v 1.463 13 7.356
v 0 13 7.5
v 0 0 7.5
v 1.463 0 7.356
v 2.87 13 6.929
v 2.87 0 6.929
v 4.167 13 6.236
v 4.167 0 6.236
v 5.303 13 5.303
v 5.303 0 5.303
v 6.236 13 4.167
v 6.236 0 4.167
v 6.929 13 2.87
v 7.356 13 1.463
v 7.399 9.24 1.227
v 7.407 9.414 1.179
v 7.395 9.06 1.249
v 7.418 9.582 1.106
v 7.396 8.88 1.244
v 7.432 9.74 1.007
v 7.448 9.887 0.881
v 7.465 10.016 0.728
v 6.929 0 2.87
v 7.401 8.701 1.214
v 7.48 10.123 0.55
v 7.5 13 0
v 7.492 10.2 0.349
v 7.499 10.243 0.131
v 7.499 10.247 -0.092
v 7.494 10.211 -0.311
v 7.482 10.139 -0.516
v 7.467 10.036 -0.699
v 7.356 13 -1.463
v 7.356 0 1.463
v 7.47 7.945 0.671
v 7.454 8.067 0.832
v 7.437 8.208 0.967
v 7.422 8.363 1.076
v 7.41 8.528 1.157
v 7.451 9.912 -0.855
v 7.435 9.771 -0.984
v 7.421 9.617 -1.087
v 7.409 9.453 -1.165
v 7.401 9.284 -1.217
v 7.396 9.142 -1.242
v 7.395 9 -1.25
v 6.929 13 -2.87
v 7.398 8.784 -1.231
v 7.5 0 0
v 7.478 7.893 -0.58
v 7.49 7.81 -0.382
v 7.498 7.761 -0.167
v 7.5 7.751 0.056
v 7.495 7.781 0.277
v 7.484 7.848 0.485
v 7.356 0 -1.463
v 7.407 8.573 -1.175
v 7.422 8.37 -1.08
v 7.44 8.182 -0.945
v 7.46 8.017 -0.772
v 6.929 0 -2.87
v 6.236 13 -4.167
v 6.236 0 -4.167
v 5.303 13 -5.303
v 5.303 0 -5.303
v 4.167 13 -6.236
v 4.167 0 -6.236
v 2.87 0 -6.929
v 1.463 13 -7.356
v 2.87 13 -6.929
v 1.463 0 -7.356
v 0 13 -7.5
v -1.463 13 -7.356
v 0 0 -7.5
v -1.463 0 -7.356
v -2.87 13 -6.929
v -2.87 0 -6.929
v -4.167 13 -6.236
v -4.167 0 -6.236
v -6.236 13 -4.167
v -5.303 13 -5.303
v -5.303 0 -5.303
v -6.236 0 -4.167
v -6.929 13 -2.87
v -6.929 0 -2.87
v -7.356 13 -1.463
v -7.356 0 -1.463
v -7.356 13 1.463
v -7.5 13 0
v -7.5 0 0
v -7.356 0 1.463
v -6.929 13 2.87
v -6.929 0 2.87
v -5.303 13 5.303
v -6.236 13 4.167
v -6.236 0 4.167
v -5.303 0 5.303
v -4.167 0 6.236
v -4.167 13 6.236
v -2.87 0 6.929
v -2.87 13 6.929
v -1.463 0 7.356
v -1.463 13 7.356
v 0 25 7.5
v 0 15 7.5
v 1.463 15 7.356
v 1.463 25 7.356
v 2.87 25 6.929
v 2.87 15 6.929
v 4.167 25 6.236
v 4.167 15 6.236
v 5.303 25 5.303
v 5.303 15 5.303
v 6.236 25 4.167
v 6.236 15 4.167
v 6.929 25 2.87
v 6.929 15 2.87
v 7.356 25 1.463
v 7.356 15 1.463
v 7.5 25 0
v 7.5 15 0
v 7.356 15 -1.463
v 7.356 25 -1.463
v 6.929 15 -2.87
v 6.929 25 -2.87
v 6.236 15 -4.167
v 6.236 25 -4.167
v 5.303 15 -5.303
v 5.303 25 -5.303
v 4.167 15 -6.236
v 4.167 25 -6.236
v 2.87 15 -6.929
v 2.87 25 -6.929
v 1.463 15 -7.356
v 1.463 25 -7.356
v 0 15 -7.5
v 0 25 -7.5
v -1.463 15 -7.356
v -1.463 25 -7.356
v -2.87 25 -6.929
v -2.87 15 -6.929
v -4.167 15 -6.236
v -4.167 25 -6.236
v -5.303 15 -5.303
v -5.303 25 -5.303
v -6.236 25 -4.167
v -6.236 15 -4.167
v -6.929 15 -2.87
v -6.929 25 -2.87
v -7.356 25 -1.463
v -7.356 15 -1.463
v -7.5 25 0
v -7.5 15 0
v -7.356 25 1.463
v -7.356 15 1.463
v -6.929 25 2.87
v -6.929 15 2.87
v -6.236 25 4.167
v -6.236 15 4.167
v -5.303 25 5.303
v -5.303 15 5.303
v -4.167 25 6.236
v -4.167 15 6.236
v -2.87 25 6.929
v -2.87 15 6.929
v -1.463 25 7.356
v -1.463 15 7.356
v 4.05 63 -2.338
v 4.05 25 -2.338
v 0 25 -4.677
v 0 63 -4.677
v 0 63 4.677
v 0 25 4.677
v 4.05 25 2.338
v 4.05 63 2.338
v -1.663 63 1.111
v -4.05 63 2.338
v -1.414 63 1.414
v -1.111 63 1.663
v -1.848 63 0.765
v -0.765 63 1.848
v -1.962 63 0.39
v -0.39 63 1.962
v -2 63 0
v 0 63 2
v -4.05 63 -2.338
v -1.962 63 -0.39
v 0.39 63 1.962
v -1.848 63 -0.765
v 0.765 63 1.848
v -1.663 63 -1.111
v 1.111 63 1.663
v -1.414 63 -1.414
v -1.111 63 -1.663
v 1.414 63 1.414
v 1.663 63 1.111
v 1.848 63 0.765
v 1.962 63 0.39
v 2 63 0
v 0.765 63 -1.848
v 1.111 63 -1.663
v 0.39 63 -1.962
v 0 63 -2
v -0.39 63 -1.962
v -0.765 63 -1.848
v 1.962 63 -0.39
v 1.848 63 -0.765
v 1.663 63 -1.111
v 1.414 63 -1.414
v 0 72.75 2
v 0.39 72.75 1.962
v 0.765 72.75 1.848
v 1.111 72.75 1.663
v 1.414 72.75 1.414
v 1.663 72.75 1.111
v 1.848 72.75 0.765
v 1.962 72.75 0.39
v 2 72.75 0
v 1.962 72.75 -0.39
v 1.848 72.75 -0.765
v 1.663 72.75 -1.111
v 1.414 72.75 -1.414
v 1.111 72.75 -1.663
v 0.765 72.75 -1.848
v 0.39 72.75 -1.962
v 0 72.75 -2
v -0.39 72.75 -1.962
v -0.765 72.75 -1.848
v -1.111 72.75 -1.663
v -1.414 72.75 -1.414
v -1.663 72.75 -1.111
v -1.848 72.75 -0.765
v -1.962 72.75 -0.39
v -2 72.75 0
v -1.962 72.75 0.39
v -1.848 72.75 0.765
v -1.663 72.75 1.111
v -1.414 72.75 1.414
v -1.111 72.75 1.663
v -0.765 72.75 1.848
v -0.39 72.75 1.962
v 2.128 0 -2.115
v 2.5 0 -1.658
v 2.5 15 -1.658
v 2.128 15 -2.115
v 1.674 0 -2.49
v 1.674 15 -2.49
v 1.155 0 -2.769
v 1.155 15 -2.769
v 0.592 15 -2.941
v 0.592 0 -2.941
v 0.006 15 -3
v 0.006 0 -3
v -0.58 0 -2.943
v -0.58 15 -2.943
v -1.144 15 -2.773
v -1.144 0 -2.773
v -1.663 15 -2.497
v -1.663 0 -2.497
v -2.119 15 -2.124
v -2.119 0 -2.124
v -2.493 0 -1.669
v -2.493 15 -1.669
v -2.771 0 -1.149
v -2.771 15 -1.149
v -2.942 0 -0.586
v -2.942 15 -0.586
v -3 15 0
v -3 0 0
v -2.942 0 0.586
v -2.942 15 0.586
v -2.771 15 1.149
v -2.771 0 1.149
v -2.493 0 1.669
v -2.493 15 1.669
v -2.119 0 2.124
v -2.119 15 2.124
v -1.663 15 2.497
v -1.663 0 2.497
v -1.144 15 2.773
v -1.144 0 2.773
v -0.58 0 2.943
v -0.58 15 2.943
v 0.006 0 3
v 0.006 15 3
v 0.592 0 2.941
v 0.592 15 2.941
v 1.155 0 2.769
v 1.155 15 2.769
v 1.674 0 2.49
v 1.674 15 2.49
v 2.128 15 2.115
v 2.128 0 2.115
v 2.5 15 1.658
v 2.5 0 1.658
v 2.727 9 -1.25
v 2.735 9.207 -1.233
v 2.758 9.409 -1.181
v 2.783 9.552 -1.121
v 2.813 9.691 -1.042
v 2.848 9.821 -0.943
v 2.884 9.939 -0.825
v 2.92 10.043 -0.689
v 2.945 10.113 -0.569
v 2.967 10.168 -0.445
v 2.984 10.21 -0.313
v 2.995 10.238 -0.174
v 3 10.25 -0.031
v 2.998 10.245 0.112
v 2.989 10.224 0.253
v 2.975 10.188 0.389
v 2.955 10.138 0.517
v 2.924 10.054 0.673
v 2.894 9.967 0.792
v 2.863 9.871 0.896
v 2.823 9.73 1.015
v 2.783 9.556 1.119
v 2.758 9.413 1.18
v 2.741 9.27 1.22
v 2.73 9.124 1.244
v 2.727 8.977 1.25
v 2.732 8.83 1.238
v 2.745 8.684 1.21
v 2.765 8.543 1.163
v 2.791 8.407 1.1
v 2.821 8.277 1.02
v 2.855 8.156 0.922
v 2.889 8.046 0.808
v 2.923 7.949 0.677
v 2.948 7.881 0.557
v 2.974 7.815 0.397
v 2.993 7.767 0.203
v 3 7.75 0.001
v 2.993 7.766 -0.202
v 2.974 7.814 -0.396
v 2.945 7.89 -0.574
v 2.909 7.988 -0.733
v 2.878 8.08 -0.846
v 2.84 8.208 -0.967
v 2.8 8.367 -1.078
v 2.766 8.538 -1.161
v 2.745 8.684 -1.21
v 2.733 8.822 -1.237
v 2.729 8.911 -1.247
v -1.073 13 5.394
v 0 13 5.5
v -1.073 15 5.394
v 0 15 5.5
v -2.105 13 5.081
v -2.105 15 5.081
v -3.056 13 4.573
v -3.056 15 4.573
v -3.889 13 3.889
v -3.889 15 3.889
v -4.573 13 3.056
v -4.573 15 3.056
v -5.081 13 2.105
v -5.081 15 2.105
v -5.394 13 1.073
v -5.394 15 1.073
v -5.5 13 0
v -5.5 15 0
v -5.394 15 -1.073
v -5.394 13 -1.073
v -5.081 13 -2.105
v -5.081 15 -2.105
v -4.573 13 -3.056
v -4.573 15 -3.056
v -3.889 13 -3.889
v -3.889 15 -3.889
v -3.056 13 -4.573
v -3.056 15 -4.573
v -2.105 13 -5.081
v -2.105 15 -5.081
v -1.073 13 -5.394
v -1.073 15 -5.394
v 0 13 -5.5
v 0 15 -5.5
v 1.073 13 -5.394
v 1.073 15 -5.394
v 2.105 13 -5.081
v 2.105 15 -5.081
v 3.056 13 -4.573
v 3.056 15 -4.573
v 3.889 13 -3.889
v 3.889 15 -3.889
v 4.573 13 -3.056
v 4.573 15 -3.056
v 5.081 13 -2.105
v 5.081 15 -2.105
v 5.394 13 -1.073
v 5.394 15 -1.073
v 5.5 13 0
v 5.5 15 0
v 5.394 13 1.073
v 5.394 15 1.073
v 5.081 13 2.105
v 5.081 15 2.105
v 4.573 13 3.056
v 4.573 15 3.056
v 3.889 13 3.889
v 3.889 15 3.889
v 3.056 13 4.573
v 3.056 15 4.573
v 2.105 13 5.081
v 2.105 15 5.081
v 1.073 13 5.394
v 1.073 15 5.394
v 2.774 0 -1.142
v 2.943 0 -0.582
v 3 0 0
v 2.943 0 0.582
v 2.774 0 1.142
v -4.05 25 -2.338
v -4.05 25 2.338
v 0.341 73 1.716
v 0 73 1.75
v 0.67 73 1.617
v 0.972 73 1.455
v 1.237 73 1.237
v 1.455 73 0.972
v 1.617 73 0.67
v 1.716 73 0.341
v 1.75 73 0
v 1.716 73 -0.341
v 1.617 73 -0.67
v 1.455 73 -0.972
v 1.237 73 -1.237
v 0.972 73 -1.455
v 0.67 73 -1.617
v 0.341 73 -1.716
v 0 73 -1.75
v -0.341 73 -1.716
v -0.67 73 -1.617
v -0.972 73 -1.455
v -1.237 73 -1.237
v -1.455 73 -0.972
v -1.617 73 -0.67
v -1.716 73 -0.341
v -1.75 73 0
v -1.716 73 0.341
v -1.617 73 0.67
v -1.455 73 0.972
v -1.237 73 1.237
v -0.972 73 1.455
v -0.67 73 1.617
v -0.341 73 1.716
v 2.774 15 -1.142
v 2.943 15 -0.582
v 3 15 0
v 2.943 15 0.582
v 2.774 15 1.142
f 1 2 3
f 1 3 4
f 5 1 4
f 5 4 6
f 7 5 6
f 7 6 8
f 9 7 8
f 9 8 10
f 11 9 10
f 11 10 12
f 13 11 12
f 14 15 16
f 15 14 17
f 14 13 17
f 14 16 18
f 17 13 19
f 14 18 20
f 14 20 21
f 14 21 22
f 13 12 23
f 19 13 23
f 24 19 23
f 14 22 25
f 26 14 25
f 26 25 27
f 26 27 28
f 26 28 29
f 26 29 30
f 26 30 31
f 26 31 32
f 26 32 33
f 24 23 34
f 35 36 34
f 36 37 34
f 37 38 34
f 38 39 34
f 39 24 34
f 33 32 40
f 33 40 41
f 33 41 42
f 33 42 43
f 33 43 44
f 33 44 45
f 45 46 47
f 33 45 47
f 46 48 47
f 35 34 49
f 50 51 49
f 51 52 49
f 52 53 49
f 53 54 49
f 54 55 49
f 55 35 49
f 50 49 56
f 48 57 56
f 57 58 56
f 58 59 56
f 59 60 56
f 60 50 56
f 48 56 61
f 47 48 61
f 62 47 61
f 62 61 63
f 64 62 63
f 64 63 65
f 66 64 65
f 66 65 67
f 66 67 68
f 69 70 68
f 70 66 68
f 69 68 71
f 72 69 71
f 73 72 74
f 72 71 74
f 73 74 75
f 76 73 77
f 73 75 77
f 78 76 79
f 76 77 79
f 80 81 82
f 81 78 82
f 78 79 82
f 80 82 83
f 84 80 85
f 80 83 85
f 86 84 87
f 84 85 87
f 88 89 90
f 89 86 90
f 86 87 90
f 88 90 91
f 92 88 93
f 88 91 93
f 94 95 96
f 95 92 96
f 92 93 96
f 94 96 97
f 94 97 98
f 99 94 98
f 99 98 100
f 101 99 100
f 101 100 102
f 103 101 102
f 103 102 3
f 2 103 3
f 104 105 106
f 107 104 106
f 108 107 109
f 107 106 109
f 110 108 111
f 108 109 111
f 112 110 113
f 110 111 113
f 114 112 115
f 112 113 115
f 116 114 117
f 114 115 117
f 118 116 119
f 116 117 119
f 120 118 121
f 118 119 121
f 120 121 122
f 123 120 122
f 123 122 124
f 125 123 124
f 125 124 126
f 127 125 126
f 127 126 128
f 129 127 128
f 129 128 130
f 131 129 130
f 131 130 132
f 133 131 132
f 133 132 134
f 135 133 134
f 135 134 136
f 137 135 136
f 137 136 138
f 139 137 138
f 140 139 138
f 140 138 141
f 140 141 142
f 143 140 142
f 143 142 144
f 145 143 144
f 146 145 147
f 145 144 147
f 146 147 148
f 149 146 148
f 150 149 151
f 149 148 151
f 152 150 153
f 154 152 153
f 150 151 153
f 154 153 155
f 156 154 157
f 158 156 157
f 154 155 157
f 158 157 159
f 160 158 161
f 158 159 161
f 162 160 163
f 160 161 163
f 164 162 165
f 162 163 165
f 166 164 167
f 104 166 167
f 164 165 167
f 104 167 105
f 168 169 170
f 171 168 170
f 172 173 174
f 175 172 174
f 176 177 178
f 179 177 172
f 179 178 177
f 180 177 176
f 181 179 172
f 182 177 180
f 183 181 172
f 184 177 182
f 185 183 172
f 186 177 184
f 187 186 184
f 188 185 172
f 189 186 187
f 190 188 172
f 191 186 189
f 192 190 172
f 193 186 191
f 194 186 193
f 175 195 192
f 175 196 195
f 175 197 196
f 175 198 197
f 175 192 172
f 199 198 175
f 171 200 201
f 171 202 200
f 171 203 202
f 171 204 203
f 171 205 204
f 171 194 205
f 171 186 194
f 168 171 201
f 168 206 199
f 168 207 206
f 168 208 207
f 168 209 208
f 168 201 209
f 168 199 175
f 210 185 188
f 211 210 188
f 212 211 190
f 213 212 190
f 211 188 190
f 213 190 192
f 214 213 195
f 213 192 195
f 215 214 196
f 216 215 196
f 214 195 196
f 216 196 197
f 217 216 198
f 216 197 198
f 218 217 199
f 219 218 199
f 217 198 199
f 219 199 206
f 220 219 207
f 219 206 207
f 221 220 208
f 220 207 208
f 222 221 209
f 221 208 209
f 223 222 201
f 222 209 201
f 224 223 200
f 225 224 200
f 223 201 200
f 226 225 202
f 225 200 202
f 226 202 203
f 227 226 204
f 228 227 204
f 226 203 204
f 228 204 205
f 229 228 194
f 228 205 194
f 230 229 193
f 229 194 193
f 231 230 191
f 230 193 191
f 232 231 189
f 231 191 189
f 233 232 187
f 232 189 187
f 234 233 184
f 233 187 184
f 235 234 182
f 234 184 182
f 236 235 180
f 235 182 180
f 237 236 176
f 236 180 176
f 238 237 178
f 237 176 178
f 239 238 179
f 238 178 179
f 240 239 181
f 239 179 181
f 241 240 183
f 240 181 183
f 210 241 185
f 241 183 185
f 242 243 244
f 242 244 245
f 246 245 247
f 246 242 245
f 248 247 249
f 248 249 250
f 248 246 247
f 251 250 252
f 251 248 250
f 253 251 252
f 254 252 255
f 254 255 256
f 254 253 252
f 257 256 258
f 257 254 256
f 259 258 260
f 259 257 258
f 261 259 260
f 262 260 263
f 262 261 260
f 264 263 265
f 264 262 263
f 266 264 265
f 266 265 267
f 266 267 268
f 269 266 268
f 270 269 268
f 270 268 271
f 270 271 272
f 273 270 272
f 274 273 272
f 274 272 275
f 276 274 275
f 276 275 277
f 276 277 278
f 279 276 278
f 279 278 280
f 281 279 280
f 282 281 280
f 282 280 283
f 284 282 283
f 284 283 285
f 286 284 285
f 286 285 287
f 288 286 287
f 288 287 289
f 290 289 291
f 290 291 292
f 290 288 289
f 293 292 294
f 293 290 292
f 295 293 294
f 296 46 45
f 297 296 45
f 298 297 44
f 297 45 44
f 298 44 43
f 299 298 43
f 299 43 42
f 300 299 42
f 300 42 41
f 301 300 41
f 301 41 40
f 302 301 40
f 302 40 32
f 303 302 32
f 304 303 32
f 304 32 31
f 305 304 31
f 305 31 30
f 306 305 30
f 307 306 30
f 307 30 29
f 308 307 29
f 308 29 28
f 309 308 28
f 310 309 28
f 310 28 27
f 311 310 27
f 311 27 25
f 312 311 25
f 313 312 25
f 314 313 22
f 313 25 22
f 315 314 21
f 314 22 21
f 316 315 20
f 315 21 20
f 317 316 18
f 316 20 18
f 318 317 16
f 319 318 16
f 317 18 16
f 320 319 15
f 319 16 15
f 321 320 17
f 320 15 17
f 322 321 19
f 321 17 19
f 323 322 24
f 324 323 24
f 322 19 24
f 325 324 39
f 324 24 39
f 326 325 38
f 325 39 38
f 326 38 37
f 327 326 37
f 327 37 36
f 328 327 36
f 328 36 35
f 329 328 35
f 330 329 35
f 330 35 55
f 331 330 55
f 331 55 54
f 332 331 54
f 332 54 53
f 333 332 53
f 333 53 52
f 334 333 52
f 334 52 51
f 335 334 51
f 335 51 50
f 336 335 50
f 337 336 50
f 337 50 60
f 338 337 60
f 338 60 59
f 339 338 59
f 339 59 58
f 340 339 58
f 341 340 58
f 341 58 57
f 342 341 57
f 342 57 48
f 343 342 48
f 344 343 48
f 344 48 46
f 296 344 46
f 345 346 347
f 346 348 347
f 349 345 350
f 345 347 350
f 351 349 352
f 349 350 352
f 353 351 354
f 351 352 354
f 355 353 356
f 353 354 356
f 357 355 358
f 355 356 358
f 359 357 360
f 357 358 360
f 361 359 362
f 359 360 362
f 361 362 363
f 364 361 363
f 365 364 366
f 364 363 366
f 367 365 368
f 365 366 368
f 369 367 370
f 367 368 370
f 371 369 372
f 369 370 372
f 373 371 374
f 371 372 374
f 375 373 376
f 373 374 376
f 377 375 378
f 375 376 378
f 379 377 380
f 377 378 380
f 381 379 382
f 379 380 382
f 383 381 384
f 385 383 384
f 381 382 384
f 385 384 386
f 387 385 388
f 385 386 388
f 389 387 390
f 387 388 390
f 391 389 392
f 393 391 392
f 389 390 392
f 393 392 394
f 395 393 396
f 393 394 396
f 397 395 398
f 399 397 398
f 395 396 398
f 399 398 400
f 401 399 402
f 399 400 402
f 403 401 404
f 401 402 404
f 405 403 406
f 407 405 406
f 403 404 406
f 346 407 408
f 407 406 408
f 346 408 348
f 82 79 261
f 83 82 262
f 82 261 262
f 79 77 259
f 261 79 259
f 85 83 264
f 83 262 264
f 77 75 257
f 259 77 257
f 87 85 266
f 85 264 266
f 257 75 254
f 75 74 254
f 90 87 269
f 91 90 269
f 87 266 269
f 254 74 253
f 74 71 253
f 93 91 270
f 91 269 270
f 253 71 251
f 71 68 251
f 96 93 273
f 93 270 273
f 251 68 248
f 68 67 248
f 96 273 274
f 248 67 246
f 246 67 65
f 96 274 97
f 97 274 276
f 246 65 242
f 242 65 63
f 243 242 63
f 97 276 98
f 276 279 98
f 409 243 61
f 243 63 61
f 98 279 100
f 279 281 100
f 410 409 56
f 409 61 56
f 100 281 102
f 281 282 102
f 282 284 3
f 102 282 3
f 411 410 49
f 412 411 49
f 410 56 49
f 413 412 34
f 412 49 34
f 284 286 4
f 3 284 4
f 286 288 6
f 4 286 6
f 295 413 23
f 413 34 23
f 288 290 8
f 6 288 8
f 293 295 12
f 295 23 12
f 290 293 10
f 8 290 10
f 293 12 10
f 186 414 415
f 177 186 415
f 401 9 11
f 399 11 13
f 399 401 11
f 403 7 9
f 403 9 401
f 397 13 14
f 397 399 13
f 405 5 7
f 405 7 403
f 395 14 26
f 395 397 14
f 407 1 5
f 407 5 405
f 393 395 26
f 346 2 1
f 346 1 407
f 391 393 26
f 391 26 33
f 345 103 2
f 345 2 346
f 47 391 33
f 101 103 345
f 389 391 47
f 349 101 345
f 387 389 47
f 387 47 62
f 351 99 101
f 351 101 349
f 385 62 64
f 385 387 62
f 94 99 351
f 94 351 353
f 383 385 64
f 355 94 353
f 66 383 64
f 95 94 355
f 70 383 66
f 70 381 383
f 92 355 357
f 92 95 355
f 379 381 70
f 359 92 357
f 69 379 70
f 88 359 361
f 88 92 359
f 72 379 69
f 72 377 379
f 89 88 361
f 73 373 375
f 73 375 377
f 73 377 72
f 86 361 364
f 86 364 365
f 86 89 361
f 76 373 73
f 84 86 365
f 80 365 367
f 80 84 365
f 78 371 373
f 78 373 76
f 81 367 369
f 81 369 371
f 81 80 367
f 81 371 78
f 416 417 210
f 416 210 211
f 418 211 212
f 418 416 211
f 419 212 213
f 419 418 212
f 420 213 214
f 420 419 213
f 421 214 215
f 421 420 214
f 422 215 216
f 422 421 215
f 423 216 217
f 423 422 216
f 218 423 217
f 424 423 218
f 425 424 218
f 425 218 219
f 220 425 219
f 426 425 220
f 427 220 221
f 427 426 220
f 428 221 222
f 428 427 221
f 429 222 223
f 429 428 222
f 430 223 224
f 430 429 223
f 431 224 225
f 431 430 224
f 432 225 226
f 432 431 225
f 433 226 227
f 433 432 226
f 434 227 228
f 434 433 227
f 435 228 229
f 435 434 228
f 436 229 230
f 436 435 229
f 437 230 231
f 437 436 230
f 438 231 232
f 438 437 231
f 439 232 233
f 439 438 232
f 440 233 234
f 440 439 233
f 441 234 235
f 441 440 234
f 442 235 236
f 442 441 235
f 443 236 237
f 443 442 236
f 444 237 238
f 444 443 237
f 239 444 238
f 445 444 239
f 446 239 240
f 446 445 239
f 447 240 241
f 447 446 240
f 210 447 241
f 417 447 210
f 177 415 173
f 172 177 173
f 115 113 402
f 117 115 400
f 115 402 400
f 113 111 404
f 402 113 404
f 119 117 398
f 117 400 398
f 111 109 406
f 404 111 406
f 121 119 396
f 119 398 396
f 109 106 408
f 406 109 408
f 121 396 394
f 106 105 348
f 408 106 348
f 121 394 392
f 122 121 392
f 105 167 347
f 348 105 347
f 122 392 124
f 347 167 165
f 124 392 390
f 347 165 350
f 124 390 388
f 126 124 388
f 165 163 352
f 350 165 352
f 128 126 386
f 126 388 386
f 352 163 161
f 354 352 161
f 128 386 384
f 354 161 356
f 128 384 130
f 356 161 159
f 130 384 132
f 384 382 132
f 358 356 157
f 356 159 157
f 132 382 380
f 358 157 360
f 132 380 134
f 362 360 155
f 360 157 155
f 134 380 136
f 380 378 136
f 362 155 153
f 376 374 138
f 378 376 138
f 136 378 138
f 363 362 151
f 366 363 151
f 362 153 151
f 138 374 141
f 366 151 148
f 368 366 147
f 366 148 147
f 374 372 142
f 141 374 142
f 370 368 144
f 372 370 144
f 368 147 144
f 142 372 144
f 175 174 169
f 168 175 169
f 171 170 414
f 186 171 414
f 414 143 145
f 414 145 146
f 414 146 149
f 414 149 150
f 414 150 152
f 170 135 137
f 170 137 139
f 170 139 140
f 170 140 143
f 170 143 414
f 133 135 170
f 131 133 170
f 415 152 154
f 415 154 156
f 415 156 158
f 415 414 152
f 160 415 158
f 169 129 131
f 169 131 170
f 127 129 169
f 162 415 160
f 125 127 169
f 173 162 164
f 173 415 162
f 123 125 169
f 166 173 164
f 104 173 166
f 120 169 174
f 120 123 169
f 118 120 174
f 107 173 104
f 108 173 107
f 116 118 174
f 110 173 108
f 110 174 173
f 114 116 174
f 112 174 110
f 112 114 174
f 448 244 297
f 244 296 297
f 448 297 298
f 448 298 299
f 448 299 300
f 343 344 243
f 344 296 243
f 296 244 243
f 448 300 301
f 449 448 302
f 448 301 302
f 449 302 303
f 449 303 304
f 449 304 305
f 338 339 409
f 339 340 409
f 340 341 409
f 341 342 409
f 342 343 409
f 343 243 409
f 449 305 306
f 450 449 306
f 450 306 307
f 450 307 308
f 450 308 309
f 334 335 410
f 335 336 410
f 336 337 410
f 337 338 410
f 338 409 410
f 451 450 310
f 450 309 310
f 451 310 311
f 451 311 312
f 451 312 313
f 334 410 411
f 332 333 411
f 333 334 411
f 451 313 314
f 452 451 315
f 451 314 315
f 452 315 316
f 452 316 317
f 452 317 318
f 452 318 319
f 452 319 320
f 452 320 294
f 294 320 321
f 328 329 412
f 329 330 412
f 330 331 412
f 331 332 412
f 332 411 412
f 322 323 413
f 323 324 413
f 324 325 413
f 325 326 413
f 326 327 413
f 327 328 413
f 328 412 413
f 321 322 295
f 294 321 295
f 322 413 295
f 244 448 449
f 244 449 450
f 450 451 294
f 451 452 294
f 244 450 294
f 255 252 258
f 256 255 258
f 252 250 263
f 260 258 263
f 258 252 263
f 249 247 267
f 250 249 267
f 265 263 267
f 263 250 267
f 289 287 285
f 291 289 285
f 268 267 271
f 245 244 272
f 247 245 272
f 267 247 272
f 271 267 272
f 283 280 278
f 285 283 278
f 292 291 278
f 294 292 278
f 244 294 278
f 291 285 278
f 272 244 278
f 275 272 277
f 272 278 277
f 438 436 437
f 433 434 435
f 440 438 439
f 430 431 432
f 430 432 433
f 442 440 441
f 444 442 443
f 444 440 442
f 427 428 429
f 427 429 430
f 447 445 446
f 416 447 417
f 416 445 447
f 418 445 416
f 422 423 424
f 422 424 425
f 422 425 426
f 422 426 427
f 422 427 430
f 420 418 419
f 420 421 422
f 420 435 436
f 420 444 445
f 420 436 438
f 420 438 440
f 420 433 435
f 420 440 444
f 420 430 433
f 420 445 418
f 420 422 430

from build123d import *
from build123d.topology import SkipClean

# Parameters (mm, degrees)
SKETCH_1_R          = 7.5
EXTRUDE_1_DEPTH     = 25
EXTRUDE_2_DEPTH     = 38
CUT_EXTRUDE_1_DEPTH = 15
SKETCH_6_R          = 3
CUT_EXTRUDE_2_DEPTH = 3
M3X0_5_1_D          = 2.5
M3X0_5_1_DEPTH      = 5
SKETCH_21_R         = 3
CUT_EXTRUDE_3_DEPTH = 15
SKETCH_3_R          = 2
EXTRUDE_3_DEPTH     = 10
CHAMFER_1_SIZE      = 0.25
SKETCH_22_W         = 3.619891
SKETCH_22_H         = 2


with BuildPart() as part:
    # Sketch 1 → Extrude 1 (new body)
    with BuildSketch(Plane(origin=(0, 0, 0), x_dir=(1, 0, 0), z_dir=(0, 1, 0))):
        with Locations(Location((0, 0, 0), (0, 0, 270))):  # turned: the seam where the file's is
            Circle(SKETCH_1_R)
    extrude(amount=EXTRUDE_1_DEPTH)

    # Sketch 2 → Extrude 2 (add)
    with BuildSketch(Plane(origin=(0, 25, 0), x_dir=(1, 0, 0), z_dir=(0, 1, 0))):
        Polygon((0, -4.676537), (4.05, -2.338269), (4.05, 2.338269), (0, 4.676537), (-4.05, 2.338269), (-4.05, -2.338269), align=None)
    extrude(amount=EXTRUDE_2_DEPTH)

    # Sketch 5 → Cut-Extrude 1 (cut)
    with BuildSketch(Plane.XZ):
        with BuildLine():
            Line((2.5, 1.658312), (2.5, -1.658312))
            ThreePointArc((2.5, -1.658312), (-3, 0), (2.5, 1.658312))
        make_face()
    extrude(amount=-CUT_EXTRUDE_1_DEPTH, mode=Mode.SUBTRACT)

    # Sketch 6 → Cut-Extrude 2 (cut)
    with SkipClean():  # keep this step's faces unmerged: merging them makes the solid invalid here
        with BuildSketch(Plane.XZ):
            with Locations(Location((0, 0, 0), (0, 0, 270))):  # turned: the seam where the file's is
                Circle(SKETCH_6_R)
        extrude(amount=-CUT_EXTRUDE_2_DEPTH, mode=Mode.SUBTRACT)

    # M3x0.5 _1
    with Locations(Plane.ZY.offset(-2.5)):
        with Locations((0, 9)):
            Hole(M3X0_5_1_D / 2, depth=M3X0_5_1_DEPTH)

    # Sketch 21 → Cut-Extrude 3 (cut)
    with SkipClean():  # keep this step's faces unmerged: merging them makes the solid invalid here
        with BuildSketch(Plane.XZ):
            with Locations(Location((0, 0, 0), (0, 0, 270))):  # turned: the seam where the file's is
                Circle(SKETCH_21_R)
        extrude(amount=-CUT_EXTRUDE_3_DEPTH, mode=Mode.SUBTRACT)

    # Sketch 3 → Extrude 3 (add)
    with SkipClean():  # keep this step's faces unmerged: merging them makes the solid invalid here
        with BuildSketch(Plane(origin=(0, 63, 0), x_dir=(1, 0, 0), z_dir=(0, 1, 0))):
            with Locations(Location((0, 0, 0), (0, 0, 270))):  # turned: the seam where the file's is
                Circle(SKETCH_3_R)
        extrude(amount=EXTRUDE_3_DEPTH)

    # Chamfer 1
    chamfer_1_edges = [part.edges().sort_by_distance(p)[0] for p in [
        (0, 73, -2),
    ]]
    chamfer(chamfer_1_edges, length=CHAMFER_1_SIZE)

    # Sketch 22 → Cut-Revolve 1 (revolve, cut)
    with SkipClean():  # keep this step's faces unmerged: merging them makes the solid invalid here
        with BuildSketch(Plane.XY, mode=Mode.PRIVATE) as cut_revolve_1_sk:
            with Locations((7.309945, 14)):
                Rectangle(SKETCH_22_W, SKETCH_22_H)
        revolve(cut_revolve_1_sk.sketch.rotate(Axis((0, 25, 0), (0, -1, 0)), 90), axis=Axis((0, 25, 0), (0, -1, 0)), mode=Mode.SUBTRACT)  # turned: the seam where the file's is


solid = part.part
